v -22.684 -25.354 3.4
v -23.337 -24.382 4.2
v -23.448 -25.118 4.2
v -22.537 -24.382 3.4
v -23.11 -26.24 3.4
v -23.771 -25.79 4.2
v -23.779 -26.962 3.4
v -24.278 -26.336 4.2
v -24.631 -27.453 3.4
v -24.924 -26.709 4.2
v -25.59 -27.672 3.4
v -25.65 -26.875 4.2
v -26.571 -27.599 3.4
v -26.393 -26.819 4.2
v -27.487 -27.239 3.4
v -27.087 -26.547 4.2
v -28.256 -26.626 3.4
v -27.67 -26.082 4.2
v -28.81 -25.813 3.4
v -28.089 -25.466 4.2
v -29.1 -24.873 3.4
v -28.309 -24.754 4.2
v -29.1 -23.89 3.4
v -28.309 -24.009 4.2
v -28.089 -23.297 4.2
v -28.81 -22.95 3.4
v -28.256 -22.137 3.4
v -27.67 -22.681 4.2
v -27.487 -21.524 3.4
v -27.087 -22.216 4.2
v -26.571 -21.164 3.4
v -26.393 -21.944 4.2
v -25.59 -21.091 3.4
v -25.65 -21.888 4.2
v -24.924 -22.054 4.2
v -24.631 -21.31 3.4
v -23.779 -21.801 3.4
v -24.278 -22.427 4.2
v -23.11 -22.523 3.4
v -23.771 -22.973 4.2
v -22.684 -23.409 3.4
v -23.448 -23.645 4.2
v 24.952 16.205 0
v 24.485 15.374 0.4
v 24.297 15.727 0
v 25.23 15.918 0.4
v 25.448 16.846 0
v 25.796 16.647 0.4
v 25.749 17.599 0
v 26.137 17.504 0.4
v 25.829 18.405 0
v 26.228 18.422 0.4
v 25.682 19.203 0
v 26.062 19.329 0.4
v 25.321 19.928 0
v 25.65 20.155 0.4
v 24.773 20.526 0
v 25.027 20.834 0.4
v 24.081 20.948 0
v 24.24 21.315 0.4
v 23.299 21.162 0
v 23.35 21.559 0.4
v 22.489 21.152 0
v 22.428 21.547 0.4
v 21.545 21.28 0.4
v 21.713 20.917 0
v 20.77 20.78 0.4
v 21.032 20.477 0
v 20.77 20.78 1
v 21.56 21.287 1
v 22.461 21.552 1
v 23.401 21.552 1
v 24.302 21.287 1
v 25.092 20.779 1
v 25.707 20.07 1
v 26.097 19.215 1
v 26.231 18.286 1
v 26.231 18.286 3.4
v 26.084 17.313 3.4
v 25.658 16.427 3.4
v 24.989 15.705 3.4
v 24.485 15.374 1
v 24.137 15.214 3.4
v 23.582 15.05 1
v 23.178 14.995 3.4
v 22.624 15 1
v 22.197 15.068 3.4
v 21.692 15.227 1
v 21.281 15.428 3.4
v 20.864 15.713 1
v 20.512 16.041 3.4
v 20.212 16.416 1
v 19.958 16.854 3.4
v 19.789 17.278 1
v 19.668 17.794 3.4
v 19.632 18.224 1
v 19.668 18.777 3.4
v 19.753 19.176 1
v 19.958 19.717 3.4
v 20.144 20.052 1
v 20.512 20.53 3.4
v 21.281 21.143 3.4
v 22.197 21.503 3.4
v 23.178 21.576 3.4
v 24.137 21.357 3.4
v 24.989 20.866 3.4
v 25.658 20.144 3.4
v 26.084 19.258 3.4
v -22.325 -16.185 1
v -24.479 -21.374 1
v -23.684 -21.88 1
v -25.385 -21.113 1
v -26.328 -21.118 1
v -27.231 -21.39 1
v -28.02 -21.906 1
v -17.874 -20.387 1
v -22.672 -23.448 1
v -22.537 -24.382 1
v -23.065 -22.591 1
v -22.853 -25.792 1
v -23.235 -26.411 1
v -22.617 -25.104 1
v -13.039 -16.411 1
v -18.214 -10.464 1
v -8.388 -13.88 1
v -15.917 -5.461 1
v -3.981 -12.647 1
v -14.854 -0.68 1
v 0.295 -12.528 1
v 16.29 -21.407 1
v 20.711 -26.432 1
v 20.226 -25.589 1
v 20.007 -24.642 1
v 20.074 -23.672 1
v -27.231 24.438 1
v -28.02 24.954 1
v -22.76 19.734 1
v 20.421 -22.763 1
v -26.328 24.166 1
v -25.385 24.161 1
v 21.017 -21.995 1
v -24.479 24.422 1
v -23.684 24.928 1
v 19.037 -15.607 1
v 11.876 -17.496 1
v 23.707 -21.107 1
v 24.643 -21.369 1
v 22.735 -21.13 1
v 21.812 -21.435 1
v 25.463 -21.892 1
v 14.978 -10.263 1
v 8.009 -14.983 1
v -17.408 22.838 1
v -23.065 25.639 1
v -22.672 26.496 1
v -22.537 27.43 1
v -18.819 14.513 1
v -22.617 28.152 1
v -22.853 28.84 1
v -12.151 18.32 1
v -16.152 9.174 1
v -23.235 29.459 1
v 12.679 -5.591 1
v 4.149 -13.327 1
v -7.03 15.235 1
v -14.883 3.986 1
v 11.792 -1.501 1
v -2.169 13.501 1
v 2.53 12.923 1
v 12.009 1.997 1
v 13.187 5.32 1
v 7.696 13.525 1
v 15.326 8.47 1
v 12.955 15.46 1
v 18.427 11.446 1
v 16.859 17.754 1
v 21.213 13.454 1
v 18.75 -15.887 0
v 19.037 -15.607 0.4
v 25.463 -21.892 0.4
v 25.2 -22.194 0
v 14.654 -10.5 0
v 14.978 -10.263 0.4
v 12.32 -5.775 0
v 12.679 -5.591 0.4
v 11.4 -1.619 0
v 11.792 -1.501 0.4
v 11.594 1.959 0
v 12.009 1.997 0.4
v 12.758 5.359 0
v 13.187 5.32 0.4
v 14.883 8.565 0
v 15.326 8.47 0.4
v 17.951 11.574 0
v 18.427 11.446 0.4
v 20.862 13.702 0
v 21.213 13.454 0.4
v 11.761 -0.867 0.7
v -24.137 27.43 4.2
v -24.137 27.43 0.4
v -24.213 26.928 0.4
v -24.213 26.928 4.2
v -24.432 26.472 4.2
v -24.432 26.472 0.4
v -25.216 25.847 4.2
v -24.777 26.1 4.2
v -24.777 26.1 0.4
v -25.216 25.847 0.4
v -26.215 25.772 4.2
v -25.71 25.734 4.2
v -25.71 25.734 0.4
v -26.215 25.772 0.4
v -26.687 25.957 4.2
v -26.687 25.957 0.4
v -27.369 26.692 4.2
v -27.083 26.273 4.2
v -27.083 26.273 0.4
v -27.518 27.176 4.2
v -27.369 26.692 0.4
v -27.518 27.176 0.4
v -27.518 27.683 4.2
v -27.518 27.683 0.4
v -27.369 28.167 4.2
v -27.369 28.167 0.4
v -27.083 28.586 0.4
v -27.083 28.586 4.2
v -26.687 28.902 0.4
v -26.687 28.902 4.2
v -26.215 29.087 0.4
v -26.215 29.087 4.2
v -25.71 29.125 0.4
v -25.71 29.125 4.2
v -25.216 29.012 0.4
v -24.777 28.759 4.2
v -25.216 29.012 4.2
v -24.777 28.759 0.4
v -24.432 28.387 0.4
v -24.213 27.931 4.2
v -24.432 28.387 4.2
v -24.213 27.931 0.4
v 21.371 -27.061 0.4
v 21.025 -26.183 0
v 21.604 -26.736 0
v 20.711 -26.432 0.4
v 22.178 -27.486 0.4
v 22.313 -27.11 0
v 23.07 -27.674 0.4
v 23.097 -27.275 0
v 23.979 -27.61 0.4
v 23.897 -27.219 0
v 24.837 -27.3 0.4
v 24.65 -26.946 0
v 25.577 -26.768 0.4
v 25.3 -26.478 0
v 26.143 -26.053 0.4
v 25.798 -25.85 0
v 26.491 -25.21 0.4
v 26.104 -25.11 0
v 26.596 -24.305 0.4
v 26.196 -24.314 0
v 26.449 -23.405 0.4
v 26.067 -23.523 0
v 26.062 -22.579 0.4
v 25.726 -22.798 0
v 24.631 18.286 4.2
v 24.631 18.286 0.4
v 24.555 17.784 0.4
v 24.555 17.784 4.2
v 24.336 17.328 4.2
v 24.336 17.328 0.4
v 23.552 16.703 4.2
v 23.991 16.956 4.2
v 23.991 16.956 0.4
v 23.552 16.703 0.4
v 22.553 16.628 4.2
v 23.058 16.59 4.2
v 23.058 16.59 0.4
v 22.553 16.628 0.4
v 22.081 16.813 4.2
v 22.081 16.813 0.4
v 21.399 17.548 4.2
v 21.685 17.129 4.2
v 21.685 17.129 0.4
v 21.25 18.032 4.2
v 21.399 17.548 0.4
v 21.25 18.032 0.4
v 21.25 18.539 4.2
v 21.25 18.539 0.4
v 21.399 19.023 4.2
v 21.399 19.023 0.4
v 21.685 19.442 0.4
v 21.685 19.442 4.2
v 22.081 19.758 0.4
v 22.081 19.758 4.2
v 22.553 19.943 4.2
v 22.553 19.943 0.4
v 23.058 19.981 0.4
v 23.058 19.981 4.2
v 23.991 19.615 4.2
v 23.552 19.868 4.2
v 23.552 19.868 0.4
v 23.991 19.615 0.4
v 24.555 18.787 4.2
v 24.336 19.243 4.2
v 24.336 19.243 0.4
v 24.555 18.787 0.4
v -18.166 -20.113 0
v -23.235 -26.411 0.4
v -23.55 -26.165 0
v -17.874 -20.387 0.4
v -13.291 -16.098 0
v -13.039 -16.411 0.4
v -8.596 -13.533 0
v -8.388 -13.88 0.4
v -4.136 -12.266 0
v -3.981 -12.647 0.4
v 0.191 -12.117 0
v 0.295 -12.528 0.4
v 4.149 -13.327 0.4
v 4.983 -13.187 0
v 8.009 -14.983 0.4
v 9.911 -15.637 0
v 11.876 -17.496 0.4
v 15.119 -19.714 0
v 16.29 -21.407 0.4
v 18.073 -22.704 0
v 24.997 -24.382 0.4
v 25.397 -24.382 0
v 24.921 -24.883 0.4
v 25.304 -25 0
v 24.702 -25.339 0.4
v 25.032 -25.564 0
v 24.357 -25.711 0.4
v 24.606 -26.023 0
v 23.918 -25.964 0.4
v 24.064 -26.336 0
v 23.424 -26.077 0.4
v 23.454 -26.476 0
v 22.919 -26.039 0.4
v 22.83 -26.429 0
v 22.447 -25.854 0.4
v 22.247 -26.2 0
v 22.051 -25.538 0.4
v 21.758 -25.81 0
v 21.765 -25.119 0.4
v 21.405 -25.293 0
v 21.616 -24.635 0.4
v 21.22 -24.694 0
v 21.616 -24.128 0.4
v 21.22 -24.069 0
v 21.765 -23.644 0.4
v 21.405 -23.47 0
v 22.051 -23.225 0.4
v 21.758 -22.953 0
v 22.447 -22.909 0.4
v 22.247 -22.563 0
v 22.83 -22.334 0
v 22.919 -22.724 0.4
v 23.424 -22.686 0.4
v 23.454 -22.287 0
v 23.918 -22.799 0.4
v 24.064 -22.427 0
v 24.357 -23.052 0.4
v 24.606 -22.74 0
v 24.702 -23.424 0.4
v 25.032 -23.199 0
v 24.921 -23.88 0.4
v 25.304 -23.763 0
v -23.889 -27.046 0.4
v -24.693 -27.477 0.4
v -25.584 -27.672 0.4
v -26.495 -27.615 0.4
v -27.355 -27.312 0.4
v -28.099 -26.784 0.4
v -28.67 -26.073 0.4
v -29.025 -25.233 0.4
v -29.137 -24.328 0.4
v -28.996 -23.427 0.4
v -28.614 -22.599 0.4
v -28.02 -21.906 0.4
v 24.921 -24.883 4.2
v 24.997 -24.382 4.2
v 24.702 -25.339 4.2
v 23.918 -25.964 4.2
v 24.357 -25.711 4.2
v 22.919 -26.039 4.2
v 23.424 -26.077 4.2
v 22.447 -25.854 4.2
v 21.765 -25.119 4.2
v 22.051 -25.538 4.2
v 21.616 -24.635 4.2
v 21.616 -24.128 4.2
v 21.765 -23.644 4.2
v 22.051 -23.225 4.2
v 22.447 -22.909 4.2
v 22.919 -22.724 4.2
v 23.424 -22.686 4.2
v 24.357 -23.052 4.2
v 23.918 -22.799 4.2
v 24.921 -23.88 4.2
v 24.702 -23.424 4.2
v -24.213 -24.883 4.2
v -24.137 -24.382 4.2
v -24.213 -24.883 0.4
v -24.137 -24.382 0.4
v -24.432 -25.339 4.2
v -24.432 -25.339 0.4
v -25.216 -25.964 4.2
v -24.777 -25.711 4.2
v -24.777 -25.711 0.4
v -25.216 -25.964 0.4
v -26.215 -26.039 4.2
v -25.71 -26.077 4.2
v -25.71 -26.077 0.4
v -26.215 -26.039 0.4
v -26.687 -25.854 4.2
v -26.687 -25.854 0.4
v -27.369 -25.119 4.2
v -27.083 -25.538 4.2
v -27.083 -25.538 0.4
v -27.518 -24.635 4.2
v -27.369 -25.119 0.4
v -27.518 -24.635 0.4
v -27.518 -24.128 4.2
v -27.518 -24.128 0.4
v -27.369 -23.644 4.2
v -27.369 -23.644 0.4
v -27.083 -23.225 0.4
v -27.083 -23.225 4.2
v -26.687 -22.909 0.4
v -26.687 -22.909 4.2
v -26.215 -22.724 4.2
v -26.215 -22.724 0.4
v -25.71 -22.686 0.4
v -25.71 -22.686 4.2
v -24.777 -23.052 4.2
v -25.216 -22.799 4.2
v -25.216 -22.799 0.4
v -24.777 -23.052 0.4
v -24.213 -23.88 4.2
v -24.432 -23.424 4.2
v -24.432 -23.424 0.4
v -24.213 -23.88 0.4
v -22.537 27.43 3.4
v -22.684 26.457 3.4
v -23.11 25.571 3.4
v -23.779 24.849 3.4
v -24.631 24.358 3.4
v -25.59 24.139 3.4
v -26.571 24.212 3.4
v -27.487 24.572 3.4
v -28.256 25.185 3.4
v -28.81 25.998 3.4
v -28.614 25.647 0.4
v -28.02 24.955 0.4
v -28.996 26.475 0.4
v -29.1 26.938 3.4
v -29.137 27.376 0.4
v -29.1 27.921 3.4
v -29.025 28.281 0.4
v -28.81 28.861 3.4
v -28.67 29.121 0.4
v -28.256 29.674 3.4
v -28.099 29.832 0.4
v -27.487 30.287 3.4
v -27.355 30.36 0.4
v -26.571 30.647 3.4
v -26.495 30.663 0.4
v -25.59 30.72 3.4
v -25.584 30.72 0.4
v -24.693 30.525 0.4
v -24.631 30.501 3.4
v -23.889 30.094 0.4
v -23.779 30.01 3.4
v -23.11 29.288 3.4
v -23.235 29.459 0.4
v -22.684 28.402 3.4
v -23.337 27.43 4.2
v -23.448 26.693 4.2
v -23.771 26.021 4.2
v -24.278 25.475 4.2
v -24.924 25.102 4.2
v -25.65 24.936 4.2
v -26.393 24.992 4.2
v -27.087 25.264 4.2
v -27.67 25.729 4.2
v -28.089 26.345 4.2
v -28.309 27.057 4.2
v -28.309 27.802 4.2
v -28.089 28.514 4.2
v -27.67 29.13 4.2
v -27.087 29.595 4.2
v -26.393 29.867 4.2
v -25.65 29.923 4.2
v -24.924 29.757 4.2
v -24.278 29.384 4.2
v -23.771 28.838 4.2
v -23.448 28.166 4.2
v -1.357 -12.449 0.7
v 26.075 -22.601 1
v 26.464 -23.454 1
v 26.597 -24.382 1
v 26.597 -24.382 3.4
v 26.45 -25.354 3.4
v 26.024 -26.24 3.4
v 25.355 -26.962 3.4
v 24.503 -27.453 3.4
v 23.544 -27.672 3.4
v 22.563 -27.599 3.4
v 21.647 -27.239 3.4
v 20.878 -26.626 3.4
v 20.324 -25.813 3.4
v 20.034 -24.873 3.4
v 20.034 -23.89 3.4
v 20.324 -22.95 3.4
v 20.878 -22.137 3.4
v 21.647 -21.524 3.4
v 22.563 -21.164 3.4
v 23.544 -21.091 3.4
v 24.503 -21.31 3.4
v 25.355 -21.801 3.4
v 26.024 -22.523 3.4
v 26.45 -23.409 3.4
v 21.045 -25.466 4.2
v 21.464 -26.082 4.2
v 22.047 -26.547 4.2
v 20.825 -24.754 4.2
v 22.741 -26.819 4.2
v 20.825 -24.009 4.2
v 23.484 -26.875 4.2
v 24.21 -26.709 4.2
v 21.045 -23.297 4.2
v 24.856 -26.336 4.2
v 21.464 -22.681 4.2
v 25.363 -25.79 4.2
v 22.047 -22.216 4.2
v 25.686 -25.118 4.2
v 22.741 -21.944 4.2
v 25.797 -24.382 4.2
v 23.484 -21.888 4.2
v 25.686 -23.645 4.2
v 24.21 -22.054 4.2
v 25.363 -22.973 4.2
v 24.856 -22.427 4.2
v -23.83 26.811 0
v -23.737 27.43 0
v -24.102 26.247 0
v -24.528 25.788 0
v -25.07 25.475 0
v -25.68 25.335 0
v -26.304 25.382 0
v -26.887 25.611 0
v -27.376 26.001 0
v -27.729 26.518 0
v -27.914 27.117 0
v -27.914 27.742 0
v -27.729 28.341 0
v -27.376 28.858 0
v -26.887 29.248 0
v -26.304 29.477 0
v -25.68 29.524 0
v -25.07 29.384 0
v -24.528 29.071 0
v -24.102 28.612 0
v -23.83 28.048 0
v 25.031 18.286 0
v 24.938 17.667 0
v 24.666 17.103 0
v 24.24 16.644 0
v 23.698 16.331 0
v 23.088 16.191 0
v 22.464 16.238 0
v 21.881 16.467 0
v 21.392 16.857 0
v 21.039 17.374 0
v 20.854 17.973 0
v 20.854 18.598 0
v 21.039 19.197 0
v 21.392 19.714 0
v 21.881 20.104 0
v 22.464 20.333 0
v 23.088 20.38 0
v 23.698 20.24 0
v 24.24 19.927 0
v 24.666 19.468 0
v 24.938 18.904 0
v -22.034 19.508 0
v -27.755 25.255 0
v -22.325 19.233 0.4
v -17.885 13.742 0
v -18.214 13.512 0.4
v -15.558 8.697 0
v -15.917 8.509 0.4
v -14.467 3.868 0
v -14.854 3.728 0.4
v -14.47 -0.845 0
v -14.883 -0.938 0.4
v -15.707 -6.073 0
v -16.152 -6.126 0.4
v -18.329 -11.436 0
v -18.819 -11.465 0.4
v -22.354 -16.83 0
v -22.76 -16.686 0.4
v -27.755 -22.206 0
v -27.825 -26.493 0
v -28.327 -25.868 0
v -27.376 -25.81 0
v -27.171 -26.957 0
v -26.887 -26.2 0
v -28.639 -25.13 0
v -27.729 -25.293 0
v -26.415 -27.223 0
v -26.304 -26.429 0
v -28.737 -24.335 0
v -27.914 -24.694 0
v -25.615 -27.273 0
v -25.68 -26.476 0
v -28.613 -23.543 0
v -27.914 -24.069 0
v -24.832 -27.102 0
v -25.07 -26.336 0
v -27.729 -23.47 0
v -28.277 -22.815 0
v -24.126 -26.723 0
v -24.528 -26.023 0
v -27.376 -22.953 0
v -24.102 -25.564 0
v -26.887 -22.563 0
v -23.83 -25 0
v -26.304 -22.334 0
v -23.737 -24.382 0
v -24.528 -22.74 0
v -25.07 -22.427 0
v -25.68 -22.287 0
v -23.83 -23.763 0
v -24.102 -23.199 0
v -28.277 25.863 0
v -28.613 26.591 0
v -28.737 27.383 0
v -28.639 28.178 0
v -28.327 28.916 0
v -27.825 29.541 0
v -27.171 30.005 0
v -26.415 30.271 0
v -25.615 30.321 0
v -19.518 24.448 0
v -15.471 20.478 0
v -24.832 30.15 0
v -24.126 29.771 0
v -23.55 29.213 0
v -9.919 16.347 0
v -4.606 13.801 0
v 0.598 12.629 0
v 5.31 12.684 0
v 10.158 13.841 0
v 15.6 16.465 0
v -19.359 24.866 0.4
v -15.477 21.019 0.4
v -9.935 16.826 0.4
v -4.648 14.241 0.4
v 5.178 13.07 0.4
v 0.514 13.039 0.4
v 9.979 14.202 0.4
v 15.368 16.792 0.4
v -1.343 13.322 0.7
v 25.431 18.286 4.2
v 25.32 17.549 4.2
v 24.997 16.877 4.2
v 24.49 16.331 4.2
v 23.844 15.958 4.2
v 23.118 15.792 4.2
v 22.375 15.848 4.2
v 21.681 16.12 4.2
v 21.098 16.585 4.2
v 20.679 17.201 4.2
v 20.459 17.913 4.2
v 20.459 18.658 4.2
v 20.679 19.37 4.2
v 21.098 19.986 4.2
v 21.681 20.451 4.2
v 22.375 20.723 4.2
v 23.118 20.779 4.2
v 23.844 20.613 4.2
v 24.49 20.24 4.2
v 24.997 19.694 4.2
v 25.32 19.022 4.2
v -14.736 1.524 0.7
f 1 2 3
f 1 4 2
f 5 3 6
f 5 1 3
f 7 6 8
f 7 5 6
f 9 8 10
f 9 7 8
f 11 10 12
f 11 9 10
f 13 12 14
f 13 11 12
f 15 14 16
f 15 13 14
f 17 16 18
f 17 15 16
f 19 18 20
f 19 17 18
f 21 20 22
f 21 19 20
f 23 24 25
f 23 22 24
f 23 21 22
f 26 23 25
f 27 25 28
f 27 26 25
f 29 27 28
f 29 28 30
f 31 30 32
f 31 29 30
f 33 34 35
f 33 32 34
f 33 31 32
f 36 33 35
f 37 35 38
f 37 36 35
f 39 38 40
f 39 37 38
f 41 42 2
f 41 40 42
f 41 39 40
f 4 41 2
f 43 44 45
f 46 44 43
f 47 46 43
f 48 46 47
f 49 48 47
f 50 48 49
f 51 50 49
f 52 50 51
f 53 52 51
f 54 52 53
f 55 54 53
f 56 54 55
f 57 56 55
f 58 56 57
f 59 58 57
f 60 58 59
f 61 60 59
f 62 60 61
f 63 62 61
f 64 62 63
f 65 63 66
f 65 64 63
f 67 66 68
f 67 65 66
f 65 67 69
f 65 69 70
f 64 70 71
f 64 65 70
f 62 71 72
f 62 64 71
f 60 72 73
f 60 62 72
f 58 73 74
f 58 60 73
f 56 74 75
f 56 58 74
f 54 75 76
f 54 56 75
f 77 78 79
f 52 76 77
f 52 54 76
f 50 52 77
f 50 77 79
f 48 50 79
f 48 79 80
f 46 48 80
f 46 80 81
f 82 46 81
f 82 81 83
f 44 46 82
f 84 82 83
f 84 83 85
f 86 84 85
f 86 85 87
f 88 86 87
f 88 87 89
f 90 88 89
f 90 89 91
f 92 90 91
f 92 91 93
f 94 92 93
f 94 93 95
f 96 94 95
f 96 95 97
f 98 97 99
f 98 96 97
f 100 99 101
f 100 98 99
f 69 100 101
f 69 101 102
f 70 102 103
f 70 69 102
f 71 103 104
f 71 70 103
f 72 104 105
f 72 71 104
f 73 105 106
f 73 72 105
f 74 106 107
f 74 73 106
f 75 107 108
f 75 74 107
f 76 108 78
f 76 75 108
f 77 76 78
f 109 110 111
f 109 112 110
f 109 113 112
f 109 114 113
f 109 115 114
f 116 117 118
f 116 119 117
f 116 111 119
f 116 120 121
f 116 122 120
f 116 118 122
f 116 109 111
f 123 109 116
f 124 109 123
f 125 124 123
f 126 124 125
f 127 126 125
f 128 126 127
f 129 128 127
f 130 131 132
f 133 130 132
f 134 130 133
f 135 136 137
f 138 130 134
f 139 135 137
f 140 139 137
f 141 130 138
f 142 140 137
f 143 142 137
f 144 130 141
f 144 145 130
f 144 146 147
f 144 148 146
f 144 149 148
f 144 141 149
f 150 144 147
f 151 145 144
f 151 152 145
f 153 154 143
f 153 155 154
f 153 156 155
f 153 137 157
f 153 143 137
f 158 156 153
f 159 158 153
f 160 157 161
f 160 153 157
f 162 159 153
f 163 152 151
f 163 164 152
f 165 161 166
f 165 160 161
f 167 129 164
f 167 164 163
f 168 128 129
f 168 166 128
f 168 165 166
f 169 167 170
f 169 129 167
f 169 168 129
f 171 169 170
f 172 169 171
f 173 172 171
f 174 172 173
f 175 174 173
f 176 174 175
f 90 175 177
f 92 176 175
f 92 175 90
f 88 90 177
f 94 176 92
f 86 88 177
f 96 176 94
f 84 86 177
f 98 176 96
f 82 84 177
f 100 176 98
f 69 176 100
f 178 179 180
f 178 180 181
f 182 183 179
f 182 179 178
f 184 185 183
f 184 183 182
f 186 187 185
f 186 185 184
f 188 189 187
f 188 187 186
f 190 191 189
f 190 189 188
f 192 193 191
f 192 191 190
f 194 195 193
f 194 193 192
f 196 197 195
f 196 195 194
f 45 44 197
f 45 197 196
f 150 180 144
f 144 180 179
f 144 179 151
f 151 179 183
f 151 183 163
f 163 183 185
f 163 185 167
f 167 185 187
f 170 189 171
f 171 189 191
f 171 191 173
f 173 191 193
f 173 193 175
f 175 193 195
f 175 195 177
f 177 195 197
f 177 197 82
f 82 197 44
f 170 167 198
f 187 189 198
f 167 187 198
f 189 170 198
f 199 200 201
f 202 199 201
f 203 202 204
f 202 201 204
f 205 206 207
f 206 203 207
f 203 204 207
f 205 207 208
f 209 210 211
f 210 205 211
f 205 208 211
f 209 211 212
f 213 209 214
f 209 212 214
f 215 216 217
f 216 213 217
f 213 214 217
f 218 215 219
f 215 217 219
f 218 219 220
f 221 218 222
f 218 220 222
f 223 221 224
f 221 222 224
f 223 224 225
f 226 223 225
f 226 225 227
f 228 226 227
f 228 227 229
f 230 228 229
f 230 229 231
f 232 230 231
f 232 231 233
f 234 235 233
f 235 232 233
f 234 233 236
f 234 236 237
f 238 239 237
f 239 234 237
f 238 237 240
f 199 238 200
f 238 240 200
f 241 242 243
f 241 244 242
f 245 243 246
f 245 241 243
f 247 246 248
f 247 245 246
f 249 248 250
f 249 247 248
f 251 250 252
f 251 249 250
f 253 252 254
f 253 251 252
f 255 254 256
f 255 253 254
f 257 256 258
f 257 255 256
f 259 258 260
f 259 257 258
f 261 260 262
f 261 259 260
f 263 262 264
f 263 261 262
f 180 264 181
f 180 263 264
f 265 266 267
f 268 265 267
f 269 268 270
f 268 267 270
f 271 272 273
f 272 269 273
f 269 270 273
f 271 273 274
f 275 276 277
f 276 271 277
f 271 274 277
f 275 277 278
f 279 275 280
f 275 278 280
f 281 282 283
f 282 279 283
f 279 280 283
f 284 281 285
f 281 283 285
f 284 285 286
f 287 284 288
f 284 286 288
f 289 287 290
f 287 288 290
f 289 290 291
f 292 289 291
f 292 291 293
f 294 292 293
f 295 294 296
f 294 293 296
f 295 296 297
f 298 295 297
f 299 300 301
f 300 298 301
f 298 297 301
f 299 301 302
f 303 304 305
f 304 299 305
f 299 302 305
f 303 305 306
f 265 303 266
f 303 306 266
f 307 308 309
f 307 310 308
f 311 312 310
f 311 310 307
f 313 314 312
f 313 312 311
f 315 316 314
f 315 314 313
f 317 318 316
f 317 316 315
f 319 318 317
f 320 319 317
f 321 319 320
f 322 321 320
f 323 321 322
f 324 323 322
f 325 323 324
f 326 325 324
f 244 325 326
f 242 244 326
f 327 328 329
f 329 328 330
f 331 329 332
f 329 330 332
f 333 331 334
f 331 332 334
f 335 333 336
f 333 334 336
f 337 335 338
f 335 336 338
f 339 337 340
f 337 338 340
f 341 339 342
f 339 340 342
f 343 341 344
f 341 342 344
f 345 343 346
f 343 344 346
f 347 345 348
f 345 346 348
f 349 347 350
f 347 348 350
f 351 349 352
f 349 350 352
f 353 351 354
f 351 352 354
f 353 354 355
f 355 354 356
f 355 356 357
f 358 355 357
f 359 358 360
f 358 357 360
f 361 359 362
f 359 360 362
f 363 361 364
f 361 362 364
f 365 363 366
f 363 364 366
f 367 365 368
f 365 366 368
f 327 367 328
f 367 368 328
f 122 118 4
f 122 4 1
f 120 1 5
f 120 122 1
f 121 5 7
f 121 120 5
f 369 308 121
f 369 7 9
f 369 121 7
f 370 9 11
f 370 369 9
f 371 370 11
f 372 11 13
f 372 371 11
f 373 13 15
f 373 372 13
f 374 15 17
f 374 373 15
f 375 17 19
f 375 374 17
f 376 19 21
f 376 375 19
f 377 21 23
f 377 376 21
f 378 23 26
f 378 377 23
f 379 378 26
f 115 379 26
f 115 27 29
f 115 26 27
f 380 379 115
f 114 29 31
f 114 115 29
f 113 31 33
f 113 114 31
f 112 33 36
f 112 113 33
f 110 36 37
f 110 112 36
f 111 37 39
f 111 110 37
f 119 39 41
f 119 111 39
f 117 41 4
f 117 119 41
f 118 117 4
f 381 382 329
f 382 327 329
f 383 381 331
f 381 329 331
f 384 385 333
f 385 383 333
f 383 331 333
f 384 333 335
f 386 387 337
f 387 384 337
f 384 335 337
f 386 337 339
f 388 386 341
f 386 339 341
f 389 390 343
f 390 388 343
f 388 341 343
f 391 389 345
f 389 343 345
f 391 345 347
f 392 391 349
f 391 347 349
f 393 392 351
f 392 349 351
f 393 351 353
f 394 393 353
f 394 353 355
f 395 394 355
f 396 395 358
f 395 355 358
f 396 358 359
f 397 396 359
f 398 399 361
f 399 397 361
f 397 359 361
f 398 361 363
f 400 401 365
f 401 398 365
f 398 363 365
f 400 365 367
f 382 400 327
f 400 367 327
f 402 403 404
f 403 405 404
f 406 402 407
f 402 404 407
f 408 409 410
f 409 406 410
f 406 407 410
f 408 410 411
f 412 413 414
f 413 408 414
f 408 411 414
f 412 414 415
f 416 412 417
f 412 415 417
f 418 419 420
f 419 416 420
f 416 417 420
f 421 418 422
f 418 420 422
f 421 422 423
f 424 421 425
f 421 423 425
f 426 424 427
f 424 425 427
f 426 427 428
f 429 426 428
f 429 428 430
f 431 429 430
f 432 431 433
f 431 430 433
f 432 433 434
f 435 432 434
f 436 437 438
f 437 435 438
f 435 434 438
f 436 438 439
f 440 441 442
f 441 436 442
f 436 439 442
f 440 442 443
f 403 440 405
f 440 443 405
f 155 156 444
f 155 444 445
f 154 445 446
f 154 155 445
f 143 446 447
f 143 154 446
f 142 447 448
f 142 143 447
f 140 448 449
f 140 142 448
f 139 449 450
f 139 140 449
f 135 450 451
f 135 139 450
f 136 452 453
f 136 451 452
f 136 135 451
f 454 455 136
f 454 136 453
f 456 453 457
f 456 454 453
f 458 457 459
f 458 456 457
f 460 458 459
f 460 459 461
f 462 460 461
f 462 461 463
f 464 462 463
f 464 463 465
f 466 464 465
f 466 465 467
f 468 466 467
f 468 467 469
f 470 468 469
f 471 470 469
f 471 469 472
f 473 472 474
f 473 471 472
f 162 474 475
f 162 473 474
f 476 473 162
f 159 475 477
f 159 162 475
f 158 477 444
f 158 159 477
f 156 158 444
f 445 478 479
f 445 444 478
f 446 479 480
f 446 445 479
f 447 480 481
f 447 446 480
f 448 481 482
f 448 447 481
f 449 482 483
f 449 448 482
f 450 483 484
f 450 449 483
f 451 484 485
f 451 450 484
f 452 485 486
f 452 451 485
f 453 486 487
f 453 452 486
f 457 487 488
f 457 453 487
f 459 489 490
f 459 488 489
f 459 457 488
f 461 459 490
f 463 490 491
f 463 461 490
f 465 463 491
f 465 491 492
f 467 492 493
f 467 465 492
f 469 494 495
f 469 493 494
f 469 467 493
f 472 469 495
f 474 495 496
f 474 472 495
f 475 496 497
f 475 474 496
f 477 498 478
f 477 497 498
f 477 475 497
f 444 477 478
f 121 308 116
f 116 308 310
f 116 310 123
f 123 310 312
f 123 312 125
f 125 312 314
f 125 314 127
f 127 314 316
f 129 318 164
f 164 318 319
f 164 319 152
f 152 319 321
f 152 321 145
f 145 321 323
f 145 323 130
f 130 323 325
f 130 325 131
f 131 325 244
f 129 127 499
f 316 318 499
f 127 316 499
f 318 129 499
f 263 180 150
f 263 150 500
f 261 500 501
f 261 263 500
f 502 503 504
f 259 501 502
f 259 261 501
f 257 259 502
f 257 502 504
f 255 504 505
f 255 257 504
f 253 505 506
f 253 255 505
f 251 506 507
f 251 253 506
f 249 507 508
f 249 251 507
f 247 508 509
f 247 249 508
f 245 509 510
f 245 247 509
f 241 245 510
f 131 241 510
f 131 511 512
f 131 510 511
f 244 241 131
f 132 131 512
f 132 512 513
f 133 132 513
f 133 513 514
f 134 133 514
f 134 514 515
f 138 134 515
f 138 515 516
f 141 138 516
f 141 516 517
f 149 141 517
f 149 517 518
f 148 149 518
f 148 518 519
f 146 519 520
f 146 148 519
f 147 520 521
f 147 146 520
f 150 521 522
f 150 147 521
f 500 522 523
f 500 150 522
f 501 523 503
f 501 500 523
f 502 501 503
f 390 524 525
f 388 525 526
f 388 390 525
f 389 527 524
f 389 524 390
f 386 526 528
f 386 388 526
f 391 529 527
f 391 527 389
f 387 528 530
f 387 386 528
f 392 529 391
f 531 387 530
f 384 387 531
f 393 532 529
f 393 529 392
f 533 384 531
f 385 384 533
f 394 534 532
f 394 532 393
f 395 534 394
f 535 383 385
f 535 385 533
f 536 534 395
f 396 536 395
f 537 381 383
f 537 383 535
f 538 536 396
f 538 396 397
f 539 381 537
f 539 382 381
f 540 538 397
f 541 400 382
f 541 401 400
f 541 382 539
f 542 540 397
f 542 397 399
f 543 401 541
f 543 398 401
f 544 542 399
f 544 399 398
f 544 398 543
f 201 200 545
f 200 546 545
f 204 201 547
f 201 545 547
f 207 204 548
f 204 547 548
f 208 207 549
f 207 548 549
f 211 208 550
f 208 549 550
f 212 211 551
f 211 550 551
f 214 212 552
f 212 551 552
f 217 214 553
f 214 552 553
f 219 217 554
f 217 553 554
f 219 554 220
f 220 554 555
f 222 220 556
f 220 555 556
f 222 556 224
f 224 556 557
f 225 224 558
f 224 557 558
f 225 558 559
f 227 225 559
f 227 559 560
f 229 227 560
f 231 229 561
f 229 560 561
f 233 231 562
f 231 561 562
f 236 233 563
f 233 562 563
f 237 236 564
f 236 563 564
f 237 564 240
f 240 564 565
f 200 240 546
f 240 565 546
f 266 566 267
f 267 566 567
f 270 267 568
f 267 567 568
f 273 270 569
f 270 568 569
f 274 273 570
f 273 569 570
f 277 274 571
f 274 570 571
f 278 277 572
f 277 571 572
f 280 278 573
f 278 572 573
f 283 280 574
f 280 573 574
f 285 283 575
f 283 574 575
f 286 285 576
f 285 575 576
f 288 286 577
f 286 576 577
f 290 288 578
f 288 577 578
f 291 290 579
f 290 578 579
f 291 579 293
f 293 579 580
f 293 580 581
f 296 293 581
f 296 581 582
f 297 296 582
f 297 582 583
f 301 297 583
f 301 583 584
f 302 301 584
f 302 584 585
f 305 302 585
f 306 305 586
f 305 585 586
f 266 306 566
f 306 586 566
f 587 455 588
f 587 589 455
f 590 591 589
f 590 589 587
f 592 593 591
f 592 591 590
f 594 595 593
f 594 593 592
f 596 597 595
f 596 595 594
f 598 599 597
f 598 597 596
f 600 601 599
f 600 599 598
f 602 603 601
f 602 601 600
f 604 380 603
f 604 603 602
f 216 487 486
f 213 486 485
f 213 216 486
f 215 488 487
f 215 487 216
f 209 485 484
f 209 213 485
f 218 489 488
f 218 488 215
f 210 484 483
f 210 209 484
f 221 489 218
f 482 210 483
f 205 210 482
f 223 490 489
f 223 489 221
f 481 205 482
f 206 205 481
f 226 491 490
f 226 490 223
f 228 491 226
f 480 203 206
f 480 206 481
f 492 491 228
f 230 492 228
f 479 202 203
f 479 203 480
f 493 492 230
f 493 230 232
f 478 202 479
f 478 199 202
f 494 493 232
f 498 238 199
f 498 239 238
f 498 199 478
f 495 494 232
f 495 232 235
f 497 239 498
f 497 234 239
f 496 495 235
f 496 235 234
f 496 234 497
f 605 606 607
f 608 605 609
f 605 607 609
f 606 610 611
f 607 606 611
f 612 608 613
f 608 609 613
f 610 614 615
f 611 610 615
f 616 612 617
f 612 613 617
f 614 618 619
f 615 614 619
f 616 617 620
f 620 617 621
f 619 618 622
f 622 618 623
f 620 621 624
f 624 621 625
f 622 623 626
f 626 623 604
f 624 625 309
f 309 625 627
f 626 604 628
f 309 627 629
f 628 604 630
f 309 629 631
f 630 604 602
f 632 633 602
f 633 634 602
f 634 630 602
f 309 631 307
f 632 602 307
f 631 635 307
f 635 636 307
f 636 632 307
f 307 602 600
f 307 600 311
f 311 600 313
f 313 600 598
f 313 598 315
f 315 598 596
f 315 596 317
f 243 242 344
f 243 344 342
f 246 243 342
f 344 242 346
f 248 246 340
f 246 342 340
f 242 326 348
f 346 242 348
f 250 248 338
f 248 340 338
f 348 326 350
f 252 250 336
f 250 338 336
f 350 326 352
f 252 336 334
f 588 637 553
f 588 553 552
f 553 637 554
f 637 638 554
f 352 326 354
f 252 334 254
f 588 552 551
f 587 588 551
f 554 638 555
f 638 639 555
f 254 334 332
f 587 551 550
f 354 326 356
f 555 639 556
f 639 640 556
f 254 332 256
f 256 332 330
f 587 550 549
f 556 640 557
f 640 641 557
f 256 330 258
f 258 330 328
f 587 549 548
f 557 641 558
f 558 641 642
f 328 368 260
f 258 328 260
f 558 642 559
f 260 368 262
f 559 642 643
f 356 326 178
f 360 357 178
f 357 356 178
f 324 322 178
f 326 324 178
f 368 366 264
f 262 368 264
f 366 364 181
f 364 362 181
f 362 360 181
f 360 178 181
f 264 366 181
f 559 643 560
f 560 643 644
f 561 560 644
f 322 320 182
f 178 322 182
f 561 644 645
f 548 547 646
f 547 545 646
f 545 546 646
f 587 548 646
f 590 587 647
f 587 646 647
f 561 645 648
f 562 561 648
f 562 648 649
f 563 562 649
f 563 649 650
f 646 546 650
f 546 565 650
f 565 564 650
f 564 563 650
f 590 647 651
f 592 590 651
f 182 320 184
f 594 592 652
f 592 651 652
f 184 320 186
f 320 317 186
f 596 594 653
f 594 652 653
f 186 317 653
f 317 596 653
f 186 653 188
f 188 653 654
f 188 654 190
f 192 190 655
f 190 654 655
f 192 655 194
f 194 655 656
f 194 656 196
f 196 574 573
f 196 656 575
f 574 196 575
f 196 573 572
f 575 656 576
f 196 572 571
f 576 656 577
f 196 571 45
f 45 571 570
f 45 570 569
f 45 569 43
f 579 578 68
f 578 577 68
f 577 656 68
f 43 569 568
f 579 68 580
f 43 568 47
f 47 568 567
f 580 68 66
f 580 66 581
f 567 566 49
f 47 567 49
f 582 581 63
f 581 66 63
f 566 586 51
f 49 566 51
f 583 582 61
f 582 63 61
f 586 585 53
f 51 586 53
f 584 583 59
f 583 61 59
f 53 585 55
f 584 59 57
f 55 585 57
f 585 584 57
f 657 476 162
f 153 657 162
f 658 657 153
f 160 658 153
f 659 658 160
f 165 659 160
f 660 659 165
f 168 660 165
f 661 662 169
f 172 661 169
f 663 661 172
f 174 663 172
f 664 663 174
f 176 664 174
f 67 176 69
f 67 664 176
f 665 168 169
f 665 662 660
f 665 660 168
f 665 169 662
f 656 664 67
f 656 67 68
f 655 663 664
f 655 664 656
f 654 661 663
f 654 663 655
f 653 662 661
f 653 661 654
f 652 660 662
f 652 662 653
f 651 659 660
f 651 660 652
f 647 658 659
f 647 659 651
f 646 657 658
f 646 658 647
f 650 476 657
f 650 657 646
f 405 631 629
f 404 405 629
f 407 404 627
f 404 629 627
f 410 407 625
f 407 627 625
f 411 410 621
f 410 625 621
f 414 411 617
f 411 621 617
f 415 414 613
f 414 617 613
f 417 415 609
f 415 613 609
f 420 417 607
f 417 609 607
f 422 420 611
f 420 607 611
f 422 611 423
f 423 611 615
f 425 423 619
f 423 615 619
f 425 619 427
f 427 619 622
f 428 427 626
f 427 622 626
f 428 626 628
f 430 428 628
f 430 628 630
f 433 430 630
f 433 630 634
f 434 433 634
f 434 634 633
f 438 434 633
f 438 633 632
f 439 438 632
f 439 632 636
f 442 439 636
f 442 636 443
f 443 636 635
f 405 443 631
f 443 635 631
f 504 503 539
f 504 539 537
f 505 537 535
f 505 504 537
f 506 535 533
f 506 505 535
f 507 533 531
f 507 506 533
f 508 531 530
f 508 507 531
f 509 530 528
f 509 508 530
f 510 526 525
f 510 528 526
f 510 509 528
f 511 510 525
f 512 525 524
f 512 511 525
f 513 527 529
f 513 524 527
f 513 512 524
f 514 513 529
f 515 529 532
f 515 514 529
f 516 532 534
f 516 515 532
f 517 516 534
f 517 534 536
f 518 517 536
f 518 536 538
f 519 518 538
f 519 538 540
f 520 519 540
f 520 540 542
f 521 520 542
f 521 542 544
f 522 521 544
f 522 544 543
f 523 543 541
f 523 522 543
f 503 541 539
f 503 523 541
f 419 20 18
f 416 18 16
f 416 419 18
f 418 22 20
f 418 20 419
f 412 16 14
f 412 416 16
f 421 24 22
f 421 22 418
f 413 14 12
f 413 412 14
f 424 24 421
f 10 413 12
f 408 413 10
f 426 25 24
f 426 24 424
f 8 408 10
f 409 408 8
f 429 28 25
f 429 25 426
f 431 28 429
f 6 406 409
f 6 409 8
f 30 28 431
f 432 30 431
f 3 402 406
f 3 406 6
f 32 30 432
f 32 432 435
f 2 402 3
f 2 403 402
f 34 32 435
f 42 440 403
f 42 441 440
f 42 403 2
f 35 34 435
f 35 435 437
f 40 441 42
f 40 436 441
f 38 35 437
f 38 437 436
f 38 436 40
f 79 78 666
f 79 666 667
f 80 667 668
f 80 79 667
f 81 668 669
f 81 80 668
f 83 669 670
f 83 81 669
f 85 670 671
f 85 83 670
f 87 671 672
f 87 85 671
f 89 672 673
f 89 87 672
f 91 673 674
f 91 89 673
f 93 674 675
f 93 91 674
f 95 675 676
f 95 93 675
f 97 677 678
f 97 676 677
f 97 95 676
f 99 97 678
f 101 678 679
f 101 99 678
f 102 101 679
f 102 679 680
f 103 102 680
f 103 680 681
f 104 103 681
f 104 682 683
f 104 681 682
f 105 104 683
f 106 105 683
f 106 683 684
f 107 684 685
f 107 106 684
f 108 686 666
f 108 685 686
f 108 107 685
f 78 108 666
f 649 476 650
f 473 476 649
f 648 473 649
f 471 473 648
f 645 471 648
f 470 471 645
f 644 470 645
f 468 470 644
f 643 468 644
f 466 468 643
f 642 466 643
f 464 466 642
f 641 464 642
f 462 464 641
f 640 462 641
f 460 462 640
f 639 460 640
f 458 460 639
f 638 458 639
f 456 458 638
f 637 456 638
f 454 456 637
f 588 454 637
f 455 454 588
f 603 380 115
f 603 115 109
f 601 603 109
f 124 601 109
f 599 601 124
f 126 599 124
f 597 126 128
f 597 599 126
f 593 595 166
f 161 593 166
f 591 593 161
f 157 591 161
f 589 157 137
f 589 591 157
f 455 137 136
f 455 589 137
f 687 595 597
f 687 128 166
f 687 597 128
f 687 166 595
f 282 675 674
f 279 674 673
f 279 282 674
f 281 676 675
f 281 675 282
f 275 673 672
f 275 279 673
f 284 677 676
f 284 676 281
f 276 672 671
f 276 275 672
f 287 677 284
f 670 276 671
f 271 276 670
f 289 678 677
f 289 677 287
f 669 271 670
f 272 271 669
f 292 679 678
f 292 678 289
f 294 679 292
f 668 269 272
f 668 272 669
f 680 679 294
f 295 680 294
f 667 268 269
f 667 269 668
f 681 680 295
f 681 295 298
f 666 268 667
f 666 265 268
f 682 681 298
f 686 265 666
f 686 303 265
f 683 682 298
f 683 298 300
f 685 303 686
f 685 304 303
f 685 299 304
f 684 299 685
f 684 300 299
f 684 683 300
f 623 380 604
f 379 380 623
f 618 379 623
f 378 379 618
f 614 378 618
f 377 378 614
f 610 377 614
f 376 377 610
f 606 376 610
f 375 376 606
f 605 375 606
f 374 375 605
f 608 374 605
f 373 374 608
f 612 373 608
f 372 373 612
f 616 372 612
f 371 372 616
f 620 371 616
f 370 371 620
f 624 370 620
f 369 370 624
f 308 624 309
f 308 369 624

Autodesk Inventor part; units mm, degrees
ref_plane "YZ Plane" through (0, 0, 0) normal (1, 0, 0) x (0, 1, 0)
ref_plane "XZ Plane" through (0, 0, 0) normal (0, 1, 0) x (-1, 0, 0)
ref_plane "XY Plane" through (0, 0, 0) normal (0, 0, 1) x (1, 0, 0)
sketch "Skizze1" plane through (0, 0, 0) normal (0, 0, 1) x (1, 0, 0)
  circle A0 centre (-25.837, 27.4295) radius 1.65 projected
  line L0 (-38.2086, 5.3216) -> (-37.4869, 5.3204) projected
  line L1 (-37.4869, 5.3204) -> (-37.4918, 2.4829) projected
  line L2 (-37.4918, 2.4829) -> (-35.7716, 2.4799) projected
  line L3 (-35.7716, 2.4799) -> (-35.7668, 5.1987) projected
  line L4 (-35.7668, 5.1987) -> (-35.0451, 5.1975) projected
  line L5 (-35.0451, 5.1975) -> (-35.0499, 2.4787) projected
  line L6 (-35.0499, 2.4787) -> (-32.1136, 2.4735) projected
  line L7 (-32.1136, 2.4735) -> (-32.115, 1.6628) projected
  line L8 (-32.115, 1.6628) -> (-38.215, 1.6735) projected
  line L9 (-38.215, 1.6735) -> (-38.2086, 5.3216) projected
  line L10 (-35.0952, -3.6509) -> (-32.1243, -3.6561) projected
  line L11 (-32.1243, -3.6561) -> (-32.1256, -4.4273) projected
  line L12 (-32.1256, -4.4273) -> (-34.7356, -4.4227) projected
  spline S0 degree 2 poles (-34.7356, -4.4227) (-35.052, -4.4222) (-35.5959, -4.4805) (-35.7592, -4.5692) knots 0 0 0 1 2 2 2 projected
  spline S1 degree 2 poles (-35.7592, -4.5692) (-35.9323, -4.6628) (-36.101, -4.9987) (-36.1015, -5.2854) knots 0 0 0 1 2 2 2 projected
  spline S2 degree 2 poles (-36.1015, -5.2854) (-36.102, -5.5721) (-35.7966, -6.1807) (-35.5499, -6.4728) knots 0 0 0 1 2 2 2 projected
  line L13 (-35.5499, -6.4728) -> (-32.1292, -6.4787) projected
  line L14 (-32.1292, -6.4787) -> (-32.1305, -7.2499) projected
  line L15 (-32.1305, -7.2499) -> (-36.708, -7.2419) projected
  line L16 (-36.708, -7.2419) -> (-36.7066, -6.4707) projected
  line L17 (-36.7066, -6.4707) -> (-36.1975, -6.4716) projected
  spline S3 degree 2 poles (-36.1975, -6.4716) (-36.5083, -6.125) (-36.8334, -5.4571) (-36.8327, -5.0815) knots 0 0 0 1 2 2 2 projected
  spline S4 degree 2 poles (-36.8327, -5.0815) (-36.8316, -4.4092) (-35.9405, -3.6495) (-35.0952, -3.6509) knots 0 0 0 1 2 2 2 projected
  line L18 (-36.71, -8.3739) -> (-32.1325, -8.3819) projected
  line L19 (-32.1325, -8.3819) -> (-32.1338, -9.153) projected
  line L20 (-32.1338, -9.153) -> (-36.7113, -9.145) projected
  line L21 (-36.7113, -9.145) -> (-36.71, -8.3739) projected
  line L22 (-32.1384, -11.773) -> (-32.1398, -12.5837) projected
  line L23 (-32.1398, -12.5837) -> (-37.5181, -12.5743) projected
  line L24 (-37.5181, -12.5743) -> (-37.5217, -14.6208) projected
  line L25 (-37.5217, -14.6208) -> (-38.2434, -14.6195) projected
  line L26 (-38.2434, -14.6195) -> (-38.2348, -9.7158) projected
  line L27 (-38.2348, -9.7158) -> (-37.5131, -9.7171) projected
  line L28 (-37.5131, -9.7171) -> (-37.5167, -11.7636) projected
  line L29 (-37.5167, -11.7636) -> (-32.1384, -11.773) projected
  line L30 (-38.2719, -8.3168) -> (-37.4711, -8.3182) projected
  line L31 (-37.4711, -8.3182) -> (-37.4727, -9.1931) projected
  line L32 (-37.4727, -9.1931) -> (-38.2735, -9.1917) projected
  line L33 (-38.2735, -9.1917) -> (-38.2719, -8.3168) projected
  line L34 (-36.695, 0.2274) -> (-36.6936, 1.0282) projected
  line L35 (-36.6936, 1.0282) -> (-30.4347, -1.4445) projected
  line L36 (-30.4347, -1.4445) -> (-30.4362, -2.27) projected
  line L37 (-30.4362, -2.27) -> (-32.3428, -1.4461) projected
  line L38 (-32.3428, -1.4461) -> (-36.7008, -3.0994) projected
  line L39 (-36.7008, -3.0994) -> (-36.6993, -2.269) projected
  line L40 (-36.6993, -2.269) -> (-33.306, -1.0242) projected
  line L41 (-33.306, -1.0242) -> (-36.695, 0.2274) projected
  line L42 (-32.103, 8.529) -> (-32.5874, 8.5299) projected
  spline S5 degree 2 poles (-32.5874, 8.5299) (-32.5184, 8.4358) (-32.2718, 8.119) (-32.1979, 7.9706) knots 0 0 0 1 2 2 2 projected
  spline S6 degree 2 poles (-32.1979, 7.9706) (-32.0895, 7.7677) (-31.9765, 7.3869) (-31.9771, 7.0409) knots 0 0 0 1 2 2 2 projected
  spline S7 degree 2 poles (-31.9771, 7.0409) (-31.9775, 6.7591) (-32.191, 6.2503) (-32.3841, 6.0579) knots 0 0 0 1 2 2 2 projected
  spline S8 degree 2 poles (-32.3841, 6.0579) (-32.5723, 5.8753) (-33.1263, 5.6538) (-33.4328, 5.6544) knots 0 0 0 1 2 2 2 projected
  spline S9 degree 2 poles (-33.4328, 5.6544) (-33.9074, 5.6552) (-34.5789, 6.0568) (-34.771, 6.4921) knots 0 0 0 1 2 2 2 projected
  spline S10 degree 2 poles (-34.771, 6.4921) (-34.9483, 6.878) (-35.0799, 7.9262) (-35.1134, 8.5343) knots 0 0 0 1 2 2 2 projected
  line L43 (-35.1134, 8.5343) -> (-35.2617, 8.5345) projected
  spline S11 degree 2 poles (-35.2617, 8.5345) (-35.5287, 8.535) (-35.8602, 8.3725) (-35.9543, 8.2243) knots 0 0 0 1 2 2 2 projected
  spline S12 degree 2 poles (-35.9543, 8.2243) (-36.0485, 8.0762) (-36.1086, 7.6512) (-36.109, 7.4238) knots 0 0 0 1 2 2 2 projected
  spline S13 degree 2 poles (-36.109, 7.4238) (-36.1094, 7.1569) (-35.9525, 6.4349) (-35.7999, 6.0737) knots 0 0 0 1 2 2 2 projected
  line L44 (-35.7999, 6.0737) -> (-35.8, 6.0292) projected
  line L45 (-35.8, 6.0292) -> (-36.586, 6.0306) projected
  spline S14 degree 2 poles (-36.586, 6.0306) (-36.6449, 6.2433) (-36.7918, 7.0394) (-36.7911, 7.4299) knots 0 0 0 1 2 2 2 projected
  spline S15 degree 2 poles (-36.7911, 7.4299) (-36.7903, 7.9045) (-36.6409, 8.5518) (-36.4476, 8.8085) knots 0 0 0 1 2 2 2 projected
  spline S16 degree 2 poles (-36.4476, 8.8085) (-36.2594, 9.0603) (-35.6608, 9.3064) (-35.2307, 9.3056) knots 0 0 0 1 2 2 2 projected
  line L46 (-35.2307, 9.3056) -> (-32.1016, 9.3002) projected
  line L47 (-32.1016, 9.3002) -> (-32.103, 8.529) projected
  line L48 (-35.0644, 13.9817) -> (-32.0935, 13.9765) projected
  line L49 (-32.0935, 13.9765) -> (-32.0948, 13.2054) projected
  line L50 (-32.0948, 13.2054) -> (-34.7049, 13.2099) projected
  spline S17 degree 2 poles (-34.7049, 13.2099) (-35.0212, 13.2105) (-35.5651, 13.1521) (-35.7284, 13.0634) knots 0 0 0 1 2 2 2 projected
  spline S18 degree 2 poles (-35.7284, 13.0634) (-35.9016, 12.9698) (-36.0702, 12.6339) (-36.0707, 12.3472) knots 0 0 0 1 2 2 2 projected
  spline S19 degree 2 poles (-36.0707, 12.3472) (-36.0712, 12.0605) (-35.7658, 11.452) (-35.5191, 11.1599) knots 0 0 0 1 2 2 2 projected
  line L51 (-35.5191, 11.1599) -> (-32.0984, 11.1539) projected
  line L52 (-32.0984, 11.1539) -> (-32.0998, 10.3828) projected
  line L53 (-32.0998, 10.3828) -> (-36.6772, 10.3907) projected
  line L54 (-36.6772, 10.3907) -> (-36.6759, 11.1619) projected
  line L55 (-36.6759, 11.1619) -> (-36.1667, 11.161) projected
  spline S20 degree 2 poles (-36.1667, 11.161) (-36.4775, 11.5076) (-36.8026, 12.1755) (-36.802, 12.5512) knots 0 0 0 1 2 2 2 projected
  spline S21 degree 2 poles (-36.802, 12.5512) (-36.8008, 13.2235) (-35.9097, 13.9832) (-35.0644, 13.9817) knots 0 0 0 1 2 2 2 projected
  circle A1 centre (-25.837, -24.3815) radius 1.65 projected
  circle A2 centre (22.931, 18.2855) radius 1.65 projected
  circle A3 centre (23.297, -24.3815) radius 1.65 projected
  arc A4 (-37.7973, 28.9208) -> (-39.6082, 27.5864) centre (-37.7217, 26.9222) ccw projected
  arc A5 (-39.6082, 27.5864) -> (-39.8919, 25.917) centre (-34.8919, 25.926) ccw projected
  line L56 (-39.8919, 25.917) -> (-39.8874, 23.4424) projected
  line L57 (-39.8874, 23.4424) -> (-39.478, 23.4424) projected
  arc A6 (-39.478, 21.4424) -> (-39.478, 23.4424) centre (-34.8856, 22.4424) ccw projected
  line L58 (-39.478, 21.4424) -> (-39.8838, 21.4424) projected
  line L59 (-39.8838, 21.4424) -> (-39.8061, -21.5576) projected
  line L60 (-39.8061, -21.5576) -> (-39.3966, -21.5576) projected
  arc A7 (-39.3966, -23.5576) -> (-39.3966, -21.5576) centre (-34.8043, -22.5576) ccw projected
  line L61 (-39.3966, -23.5576) -> (-39.8025, -23.5576) projected
  line L62 (-39.8025, -23.5576) -> (-39.798, -26.0503) projected
  arc A8 (-39.798, -26.0503) -> (-39.5082, -27.7186) centre (-34.798, -26.0413) ccw projected
  arc A9 (-39.5082, -27.7186) -> (-37.6925, -29.0465) centre (-37.6241, -27.0477) ccw projected
  line L63 (-37.6925, -29.0465) -> (-31.8925, -29.036) projected
  spline S22 degree 2 poles (-31.8925, -29.036) (-30.8606, -29.0341) (-25.3454, -28.3512) knots -2 -2 -2 -1 -1 -1 projected
  arc A10 (-25.3454, -28.3512) -> (-22.6346, -26.7782) centre (-25.837, -24.3815) ccw projected
  spline S23 degree 2 poles (-22.6346, -26.7782) (-1.453, 1.524) (20.1144, -26.8045) knots -2 -2 -2 -1 -1 -1 projected
  arc A11 (20.1144, -26.8045) -> (25.8626, -21.3127) centre (23.297, -24.3815) ccw projected
  arc A12 (24.7305, 14.7131) -> (20.2403, 21.2453) centre (22.931, 18.2855) ccw projected
  spline S24 degree 2 poles (20.2403, 21.2453) (-1.453, 1.524) (-22.6346, 29.8262) knots -2 -2 -2 -1 -1 -1 projected
  arc A13 (-22.6346, 29.8262) -> (-27.9876, 30.8022) centre (-25.837, 27.4295) ccw projected
  spline S25 degree 2 poles (-27.9876, 30.8022) (-30.9185, 28.9332) (-31.9973, 28.9313) knots -2 -2 -2 -1 -1 -1 projected
  line L64 (-31.9973, 28.9313) -> (-37.7973, 28.9208) projected
  circle A14 centre (-25.837, 27.4295) radius 1.7
  circle A15 centre (-25.837, -24.3815) radius 1.7
  circle A16 centre (23.297, -24.3815) radius 1.7
  circle A17 centre (22.931, 18.2855) radius 1.7
  circle A18 centre (-25.837, 27.4295) radius 3.3
  circle A19 centre (22.931, 18.2855) radius 3.3
  circle A20 centre (23.297, -24.3815) radius 3.3
  circle A21 centre (-25.837, -24.3815) radius 3.3
  line L65 (-28.0198, -21.9065) -> (-1.453, 1.524) construction
  line L66 (-1.453, 1.524) -> (-28.0198, 24.9545) construction
  spline S26 degree 2 poles (-28.0198, -21.9065) (-1.453, 1.524) (-28.0198, 24.9545) knots 1 1 1 2 2 2
  line L67 (-23.2346, 29.4587) -> (-1.453, 1.524) construction
  line L68 (-1.453, 1.524) -> (20.77, 20.7795) construction
  spline S27 degree 2 poles (-23.2346, 29.4587) (-1.453, 1.524) (20.77, 20.7795) knots 1 1 1 2 2 2
  line L69 (-23.2346, -26.4107) -> (-1.453, 1.524) construction
  line L70 (-1.453, 1.524) -> (20.7111, -26.4317) construction
  spline S28 degree 2 poles (-23.2346, -26.4107) (-1.453, 1.524) (20.7111, -26.4317) knots 1 1 1 2 2 2
  line L71 (25.4629, -21.8918) -> (-1.453, 1.524) construction
  line L72 (-1.453, 1.524) -> (24.4854, 15.3745) construction
  spline S29 degree 2 poles (25.4629, -21.8918) (-1.453, 1.524) (24.4854, 15.3745) knots 1 1 1 2 2 2
  spline S30 degree 2 poles (25.8626, -21.3127) (21.9132, -18.0109) (19.0822, -14.9107) knots -2 -2 -2 -1.855416 -1.855416 -1.855416 projected
  spline S31 degree 2 poles (17.22, 9.815) (18.4126, 10.8679) (19.8732, 11.8725) knots 1.825455 1.825455 1.825455 1.896249 1.896249 1.896249 projected
  spline S32 degree 2 poles (17.22, -12.7436) (6.6116, 0.4487) (17.22, 9.815) knots -1.804293 -1.804293 -1.804293 -1.174545 -1.174545 -1.174545 projected
  spline S33 degree 2 poles (19.8732, 11.8725) (22.0139, 13.3447) (24.7305, 14.7131) knots -1.103751 -1.103751 -1.103751 -1 -1 -1 projected
  spline S34 degree 2 poles (19.0822, -14.9107) (18.0812, -13.8146) (17.22, -12.7436) knots 1.144584 1.144584 1.144584 1.195707 1.195707 1.195707 projected
  point P0 (0, 0)
  point P1 (24.4854, 15.3745)
  point P2 (20.77, 20.7795)
  dimension "d5" = 6.6
  dimension "d0" = 3.4
  dimension "d1" = 3.4
  dimension "d2" = 3.4
  dimension "d3" = 3.4
  dimension "d4" = 1.6
  dimension "d6" = 6.6
  dimension "d7" = 6.6
  dimension "d8" = 6.6
  dimension "d9" = 51.811
  dimension "d10" = 25.9055
  dimension "d11" = 48.768
  dimension "d12" = 24.384
extrude "Extrusion1" add sketch "Skizze1" along normal blind 1 contours A18 | A18 S27 A19 S29 A20 S28 A21 S26 | A19 | A21 | A20
sketch "Skizze2" plane through (0, 0, 1) normal (0, 0, 1) x (1, 0, 0)
  circle A0 centre (-25.837, 27.4295) radius 1.7 projected
  circle A1 centre (22.931, 18.2855) radius 1.7 projected
  circle A2 centre (23.297, -24.3815) radius 1.7 projected
  circle A3 centre (-25.837, -24.3815) radius 1.7 projected
  circle A4 centre (-25.837, 27.4295) radius 1.7 projected
  circle A5 centre (-25.837, 27.4295) radius 3.3
  circle A6 centre (22.931, 18.2855) radius 3.3
  circle A7 centre (23.297, -24.3815) radius 3.3
  circle A8 centre (-25.837, -24.3815) radius 3.3
  point P0 (0, 0)
  dimension "d15" = 6.6
  dimension "d16" = 6.6
  dimension "d17" = 6.6
  dimension "d18" = 6.6
extrude "Extrusion2" add sketch "Skizze2" along normal blind 3.2
chamfer "Fase1" distance 0.4 angle 45 12 edges at (-1.3426, 13.3215, 0) (-28.0988, 29.8325, 0) (-14.7364, 1.524, 0) (-28.0988, -26.7845, 0) (-1.3574, -12.4486, 0) (25.5766, -26.7676, 0) (11.7606, -0.8673, 0) (25.6505, 20.1549, 0) (-27.537, 27.4295, 0) (-27.537, -24.3815, 0) (21.597, -24.3815, 0) (21.231, 18.2855, 0)
chamfer "Fase2" distance 0.8 angle 45 4 edges at (-29.137, 27.4295, 4.2) (19.631, 18.2855, 4.2) (19.997, -24.3815, 4.2) (-29.137, -24.3815, 4.2)
equation "\"d6\" = d5"
equation "\"d7\" = d5"
equation "\"d8\" = d5"
equation "\"d10\" = 0.5 * d9"
equation "\"d12\" = 0.5 * d11"
properties part number "TinyFan_Extrusion_Top"
